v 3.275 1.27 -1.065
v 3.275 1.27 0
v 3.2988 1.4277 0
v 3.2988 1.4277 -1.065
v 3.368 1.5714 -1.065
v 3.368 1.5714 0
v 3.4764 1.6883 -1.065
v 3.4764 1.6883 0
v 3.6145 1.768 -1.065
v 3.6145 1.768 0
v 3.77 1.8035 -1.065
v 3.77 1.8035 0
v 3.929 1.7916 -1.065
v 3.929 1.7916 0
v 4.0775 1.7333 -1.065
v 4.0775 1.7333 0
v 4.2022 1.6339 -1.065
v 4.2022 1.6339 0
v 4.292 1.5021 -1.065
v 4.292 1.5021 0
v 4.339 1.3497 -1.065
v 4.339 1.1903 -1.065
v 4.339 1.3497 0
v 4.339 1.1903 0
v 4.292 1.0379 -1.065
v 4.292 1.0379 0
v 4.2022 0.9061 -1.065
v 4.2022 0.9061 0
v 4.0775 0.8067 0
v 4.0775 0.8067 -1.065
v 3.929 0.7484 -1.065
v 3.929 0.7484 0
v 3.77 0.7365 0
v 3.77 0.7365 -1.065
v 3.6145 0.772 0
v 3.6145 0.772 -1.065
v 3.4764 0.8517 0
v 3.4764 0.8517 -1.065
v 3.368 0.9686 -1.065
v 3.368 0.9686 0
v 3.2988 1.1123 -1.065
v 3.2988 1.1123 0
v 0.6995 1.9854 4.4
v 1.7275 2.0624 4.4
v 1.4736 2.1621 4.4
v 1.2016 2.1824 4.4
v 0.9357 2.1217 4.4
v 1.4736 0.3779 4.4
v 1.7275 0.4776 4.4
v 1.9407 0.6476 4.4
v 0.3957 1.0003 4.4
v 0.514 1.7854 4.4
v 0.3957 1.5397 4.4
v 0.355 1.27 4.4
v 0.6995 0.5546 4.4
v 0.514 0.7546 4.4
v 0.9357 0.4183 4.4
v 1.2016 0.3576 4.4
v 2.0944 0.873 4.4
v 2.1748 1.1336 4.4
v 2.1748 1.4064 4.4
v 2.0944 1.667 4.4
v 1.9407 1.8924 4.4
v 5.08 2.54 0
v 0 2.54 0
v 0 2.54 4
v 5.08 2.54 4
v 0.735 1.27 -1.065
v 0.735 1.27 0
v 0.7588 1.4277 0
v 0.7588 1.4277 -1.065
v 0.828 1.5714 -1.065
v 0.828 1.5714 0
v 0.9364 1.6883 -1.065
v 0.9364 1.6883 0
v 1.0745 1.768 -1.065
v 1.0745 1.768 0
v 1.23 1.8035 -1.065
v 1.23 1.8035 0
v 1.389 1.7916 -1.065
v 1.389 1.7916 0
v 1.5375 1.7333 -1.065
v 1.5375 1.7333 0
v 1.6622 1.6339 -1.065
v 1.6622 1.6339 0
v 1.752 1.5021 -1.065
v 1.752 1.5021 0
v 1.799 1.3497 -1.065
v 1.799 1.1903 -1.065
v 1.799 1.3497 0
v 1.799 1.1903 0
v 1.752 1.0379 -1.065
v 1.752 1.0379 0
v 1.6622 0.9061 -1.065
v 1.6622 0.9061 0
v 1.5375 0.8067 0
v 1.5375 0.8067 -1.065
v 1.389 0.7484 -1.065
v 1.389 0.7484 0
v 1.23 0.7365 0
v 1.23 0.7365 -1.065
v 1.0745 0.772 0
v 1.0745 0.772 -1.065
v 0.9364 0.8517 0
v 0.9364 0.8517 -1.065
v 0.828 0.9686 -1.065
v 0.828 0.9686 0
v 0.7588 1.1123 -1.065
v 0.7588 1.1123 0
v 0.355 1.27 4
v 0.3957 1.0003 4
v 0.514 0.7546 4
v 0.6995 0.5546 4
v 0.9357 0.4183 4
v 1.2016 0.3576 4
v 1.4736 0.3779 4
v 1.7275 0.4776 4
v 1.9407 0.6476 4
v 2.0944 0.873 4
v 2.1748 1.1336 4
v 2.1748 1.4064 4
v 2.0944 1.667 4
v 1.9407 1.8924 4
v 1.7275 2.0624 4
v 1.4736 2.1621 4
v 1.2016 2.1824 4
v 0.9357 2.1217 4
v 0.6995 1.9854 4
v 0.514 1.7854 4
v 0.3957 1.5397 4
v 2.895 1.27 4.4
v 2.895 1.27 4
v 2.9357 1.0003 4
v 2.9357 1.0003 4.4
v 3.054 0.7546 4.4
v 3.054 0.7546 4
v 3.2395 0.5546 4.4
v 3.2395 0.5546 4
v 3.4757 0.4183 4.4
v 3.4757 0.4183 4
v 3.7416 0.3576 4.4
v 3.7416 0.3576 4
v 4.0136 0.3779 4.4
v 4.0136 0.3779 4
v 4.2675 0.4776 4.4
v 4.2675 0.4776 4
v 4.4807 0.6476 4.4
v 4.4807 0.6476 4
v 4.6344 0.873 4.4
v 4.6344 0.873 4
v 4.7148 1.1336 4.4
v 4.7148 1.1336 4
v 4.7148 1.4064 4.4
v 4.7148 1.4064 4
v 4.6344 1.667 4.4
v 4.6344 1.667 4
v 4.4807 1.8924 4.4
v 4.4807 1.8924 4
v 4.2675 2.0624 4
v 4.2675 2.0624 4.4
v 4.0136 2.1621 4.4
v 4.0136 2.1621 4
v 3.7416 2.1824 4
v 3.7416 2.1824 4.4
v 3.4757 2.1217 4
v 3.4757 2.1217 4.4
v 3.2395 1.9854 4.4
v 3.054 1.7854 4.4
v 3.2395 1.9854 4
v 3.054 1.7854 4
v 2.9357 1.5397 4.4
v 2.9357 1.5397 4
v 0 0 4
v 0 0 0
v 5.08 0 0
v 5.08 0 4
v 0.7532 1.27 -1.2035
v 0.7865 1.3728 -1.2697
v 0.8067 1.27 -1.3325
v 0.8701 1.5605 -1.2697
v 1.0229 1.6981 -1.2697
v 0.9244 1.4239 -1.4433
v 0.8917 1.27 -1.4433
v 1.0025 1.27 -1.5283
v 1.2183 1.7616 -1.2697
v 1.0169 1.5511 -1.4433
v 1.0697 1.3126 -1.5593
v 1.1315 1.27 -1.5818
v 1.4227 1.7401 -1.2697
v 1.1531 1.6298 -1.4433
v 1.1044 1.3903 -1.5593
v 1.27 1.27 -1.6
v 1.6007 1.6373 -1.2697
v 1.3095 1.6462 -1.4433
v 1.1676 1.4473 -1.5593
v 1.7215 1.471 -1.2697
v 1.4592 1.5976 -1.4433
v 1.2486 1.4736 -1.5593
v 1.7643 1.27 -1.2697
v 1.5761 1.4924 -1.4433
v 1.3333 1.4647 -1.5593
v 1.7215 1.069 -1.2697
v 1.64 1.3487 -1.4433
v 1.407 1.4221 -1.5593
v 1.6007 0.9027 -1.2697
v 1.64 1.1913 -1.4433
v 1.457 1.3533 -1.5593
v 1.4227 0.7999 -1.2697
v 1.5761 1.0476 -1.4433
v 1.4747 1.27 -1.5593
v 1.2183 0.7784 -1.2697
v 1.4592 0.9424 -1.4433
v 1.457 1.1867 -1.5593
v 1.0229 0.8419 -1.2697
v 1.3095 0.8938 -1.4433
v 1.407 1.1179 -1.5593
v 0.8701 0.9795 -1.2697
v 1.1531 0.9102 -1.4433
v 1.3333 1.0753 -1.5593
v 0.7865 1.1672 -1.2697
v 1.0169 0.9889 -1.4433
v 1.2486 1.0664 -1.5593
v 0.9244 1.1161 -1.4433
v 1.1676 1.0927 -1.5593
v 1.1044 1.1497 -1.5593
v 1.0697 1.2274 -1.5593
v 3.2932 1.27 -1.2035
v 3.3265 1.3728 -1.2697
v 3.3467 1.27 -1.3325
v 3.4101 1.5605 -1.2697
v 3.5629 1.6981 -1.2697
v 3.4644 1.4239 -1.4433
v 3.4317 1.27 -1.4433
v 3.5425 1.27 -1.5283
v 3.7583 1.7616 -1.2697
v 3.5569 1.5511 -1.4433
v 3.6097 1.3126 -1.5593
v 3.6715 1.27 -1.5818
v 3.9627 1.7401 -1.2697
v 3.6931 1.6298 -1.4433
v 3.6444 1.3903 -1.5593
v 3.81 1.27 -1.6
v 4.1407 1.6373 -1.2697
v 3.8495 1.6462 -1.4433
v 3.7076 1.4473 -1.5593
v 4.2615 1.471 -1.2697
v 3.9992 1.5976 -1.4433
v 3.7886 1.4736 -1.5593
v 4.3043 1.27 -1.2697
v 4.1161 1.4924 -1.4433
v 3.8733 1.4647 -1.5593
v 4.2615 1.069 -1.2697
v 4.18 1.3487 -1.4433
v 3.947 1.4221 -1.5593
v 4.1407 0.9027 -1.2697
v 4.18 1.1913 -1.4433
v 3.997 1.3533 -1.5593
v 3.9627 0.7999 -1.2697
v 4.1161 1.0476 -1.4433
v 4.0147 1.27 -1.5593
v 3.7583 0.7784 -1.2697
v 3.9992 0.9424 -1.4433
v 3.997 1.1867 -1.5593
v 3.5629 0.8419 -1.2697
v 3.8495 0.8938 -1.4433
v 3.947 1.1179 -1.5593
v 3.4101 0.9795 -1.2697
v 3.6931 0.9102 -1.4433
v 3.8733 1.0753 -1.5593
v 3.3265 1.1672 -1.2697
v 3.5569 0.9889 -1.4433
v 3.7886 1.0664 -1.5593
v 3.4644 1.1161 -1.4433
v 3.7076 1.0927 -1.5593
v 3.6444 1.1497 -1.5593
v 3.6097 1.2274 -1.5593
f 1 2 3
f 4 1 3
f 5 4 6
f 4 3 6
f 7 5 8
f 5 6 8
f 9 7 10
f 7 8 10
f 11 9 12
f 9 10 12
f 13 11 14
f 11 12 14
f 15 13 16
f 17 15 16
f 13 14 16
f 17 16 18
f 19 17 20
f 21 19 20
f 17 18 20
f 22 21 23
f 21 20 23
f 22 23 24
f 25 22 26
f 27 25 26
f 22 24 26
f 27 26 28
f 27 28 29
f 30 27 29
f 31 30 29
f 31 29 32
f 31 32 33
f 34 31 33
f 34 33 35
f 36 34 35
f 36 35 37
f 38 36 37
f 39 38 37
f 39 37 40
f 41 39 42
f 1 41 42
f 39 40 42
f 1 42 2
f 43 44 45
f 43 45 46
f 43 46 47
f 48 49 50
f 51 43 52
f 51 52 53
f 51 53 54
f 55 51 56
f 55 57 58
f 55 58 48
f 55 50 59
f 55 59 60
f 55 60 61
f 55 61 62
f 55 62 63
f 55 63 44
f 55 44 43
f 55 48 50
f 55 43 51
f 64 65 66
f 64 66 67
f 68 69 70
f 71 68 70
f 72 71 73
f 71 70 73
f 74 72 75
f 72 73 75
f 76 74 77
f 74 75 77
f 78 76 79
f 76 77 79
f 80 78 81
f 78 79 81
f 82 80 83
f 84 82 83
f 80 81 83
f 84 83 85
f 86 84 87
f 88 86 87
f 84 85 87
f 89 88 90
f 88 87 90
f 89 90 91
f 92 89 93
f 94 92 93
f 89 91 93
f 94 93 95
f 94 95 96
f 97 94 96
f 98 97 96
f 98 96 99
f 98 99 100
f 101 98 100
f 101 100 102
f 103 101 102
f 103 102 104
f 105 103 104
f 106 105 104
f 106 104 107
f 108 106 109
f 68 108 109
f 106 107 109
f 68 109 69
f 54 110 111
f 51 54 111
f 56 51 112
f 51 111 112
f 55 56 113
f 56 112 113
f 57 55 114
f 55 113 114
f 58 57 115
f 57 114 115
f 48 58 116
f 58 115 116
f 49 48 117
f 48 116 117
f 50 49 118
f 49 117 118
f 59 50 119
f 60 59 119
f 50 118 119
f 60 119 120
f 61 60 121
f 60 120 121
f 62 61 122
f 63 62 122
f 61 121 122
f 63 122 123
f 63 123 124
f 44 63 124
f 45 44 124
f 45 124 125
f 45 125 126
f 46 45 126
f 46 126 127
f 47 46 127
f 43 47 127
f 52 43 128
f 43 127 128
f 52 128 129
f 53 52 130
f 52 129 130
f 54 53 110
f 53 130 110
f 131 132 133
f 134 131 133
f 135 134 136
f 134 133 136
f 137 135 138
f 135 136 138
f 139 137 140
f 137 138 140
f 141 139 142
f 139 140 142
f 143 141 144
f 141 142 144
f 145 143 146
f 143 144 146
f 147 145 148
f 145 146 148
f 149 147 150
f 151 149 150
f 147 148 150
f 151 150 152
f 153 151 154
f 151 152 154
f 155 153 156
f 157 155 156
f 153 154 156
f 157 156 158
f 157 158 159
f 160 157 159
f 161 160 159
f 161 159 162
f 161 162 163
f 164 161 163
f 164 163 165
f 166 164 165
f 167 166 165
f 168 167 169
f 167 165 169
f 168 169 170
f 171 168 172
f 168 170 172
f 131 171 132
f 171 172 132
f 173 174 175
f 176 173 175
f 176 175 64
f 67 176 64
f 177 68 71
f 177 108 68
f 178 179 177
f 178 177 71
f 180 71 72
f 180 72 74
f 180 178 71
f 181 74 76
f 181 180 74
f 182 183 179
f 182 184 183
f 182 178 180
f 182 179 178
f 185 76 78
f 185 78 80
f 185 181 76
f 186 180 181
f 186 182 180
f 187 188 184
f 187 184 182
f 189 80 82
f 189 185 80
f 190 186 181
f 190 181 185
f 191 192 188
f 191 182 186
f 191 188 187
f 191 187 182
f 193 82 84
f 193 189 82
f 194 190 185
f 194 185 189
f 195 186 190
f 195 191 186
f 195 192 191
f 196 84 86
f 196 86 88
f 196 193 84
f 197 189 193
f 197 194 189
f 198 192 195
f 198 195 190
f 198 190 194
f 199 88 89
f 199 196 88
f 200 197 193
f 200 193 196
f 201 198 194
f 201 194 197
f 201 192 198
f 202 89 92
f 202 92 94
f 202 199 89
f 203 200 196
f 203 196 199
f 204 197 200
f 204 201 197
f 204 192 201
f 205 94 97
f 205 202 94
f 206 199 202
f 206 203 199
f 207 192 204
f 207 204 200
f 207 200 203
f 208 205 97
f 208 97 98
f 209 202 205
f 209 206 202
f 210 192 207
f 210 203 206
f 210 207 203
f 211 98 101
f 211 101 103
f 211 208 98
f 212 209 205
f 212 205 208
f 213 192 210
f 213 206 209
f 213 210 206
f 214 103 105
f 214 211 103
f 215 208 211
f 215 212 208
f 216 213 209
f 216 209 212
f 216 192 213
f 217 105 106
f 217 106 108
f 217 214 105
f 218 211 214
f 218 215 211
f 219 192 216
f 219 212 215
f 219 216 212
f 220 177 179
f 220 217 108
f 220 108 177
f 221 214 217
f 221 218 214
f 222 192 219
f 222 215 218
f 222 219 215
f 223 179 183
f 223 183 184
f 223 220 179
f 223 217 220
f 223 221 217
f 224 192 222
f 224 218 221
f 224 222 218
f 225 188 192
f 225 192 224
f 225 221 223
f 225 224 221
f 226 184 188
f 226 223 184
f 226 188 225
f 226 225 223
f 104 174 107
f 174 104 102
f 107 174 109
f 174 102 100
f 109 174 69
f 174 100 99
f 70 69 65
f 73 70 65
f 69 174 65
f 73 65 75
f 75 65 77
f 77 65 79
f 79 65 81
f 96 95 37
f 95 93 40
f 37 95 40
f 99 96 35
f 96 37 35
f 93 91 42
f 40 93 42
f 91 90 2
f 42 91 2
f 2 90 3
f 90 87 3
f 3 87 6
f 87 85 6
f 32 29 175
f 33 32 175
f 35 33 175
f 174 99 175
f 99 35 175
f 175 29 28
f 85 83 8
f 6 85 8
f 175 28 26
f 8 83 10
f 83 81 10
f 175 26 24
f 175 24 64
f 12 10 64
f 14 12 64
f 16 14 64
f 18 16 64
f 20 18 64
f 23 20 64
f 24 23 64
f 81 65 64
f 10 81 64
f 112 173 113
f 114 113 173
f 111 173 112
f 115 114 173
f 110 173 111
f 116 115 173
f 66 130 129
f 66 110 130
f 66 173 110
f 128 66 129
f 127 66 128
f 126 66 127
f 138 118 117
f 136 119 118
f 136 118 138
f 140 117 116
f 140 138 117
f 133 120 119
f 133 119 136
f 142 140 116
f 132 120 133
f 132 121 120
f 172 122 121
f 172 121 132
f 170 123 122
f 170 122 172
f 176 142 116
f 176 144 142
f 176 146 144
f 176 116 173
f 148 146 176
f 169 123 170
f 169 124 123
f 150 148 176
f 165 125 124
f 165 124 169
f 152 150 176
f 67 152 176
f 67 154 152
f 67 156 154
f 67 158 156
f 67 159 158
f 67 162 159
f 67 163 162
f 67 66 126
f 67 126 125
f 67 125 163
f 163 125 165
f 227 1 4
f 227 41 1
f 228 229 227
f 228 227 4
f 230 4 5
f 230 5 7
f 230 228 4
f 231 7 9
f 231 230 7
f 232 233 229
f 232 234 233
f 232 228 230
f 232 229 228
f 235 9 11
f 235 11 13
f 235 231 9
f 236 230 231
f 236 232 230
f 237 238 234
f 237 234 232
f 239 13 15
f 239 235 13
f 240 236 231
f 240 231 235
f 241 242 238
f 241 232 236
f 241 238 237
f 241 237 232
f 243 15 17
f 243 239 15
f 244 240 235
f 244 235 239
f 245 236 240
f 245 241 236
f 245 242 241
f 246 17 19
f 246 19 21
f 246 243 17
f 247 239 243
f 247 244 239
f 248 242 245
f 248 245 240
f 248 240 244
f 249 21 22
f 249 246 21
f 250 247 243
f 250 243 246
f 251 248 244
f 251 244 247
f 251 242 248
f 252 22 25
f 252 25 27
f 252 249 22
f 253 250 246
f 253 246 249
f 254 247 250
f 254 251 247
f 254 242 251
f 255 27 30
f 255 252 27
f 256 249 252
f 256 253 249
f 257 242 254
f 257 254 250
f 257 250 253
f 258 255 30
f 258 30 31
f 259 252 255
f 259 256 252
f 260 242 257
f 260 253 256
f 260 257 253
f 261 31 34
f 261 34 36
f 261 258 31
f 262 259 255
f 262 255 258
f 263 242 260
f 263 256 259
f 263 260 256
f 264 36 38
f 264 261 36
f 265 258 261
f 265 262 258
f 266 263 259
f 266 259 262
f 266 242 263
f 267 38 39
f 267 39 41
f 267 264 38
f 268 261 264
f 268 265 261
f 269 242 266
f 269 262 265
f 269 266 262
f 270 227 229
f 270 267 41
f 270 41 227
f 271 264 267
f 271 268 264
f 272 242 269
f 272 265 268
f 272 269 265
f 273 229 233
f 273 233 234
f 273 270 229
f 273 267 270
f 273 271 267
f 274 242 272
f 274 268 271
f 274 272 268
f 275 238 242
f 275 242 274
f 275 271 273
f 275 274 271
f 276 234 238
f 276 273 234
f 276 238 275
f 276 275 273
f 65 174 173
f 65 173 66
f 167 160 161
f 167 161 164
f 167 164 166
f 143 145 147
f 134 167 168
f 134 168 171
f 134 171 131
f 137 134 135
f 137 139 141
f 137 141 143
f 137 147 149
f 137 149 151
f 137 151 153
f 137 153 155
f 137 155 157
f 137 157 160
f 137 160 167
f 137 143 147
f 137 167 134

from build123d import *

# Parameters (mm, degrees)
ESQUISSE1_W       = 5.08
ESQUISSE1_H       = 2.54
EXTRUSION1_DEPTH  = 4
ESQUISSE2_R       = 0.915
EXTRUSION2_DEPTH  = 0.4
ESQUISSE3_R       = 0.535
EXTRUSION3_DEPTH  = 1.065
D_ME1_FACE_RADIUS = 0.535
D_ME1_HEIGHT      = 0.535
D_ME2_FACE_RADIUS = 0.535
D_ME2_HEIGHT      = 0.535


with BuildPart() as part:
    # Esquisse1 → Extrusion1 (new body)
    with BuildSketch(Plane.XY):
        with Locations((2.54, 1.27)):
            Rectangle(ESQUISSE1_W, ESQUISSE1_H)
    extrude(amount=EXTRUSION1_DEPTH)

    # Esquisse2 → Extrusion2 (add)
    with BuildSketch(Plane.XY.offset(4)):
        with Locations(Location((3.81, 1.27, 0), (0, 0, 180))):
            Circle(ESQUISSE2_R)
        with Locations(Location((1.27, 1.27, 0), (0, 0, 180))):
            Circle(ESQUISSE2_R)
    extrude(amount=EXTRUSION2_DEPTH)

    # Esquisse3 → Extrusion3 (add)
    with BuildSketch(Plane(origin=(0, 0, 0), x_dir=(-1, 0, 0), z_dir=(0, 0, -1))):
        with Locations((-3.81, 1.27)):
            Circle(ESQUISSE3_R)
        with Locations((-1.27, 1.27)):
            Circle(ESQUISSE3_R)
    extrude(amount=EXTRUSION3_DEPTH)

    # Dôme1: a dome of height H over a round flat face of radius A is a cap of a sphere of radius (A * A + H * H) / (2 * H)
    d_me1_r = (D_ME1_FACE_RADIUS * D_ME1_FACE_RADIUS + D_ME1_HEIGHT * D_ME1_HEIGHT) / (2 * D_ME1_HEIGHT)
    d_me1_base = Plane((3.81, 1.27, -1.065), z_dir=(0, 0, -1))
    with Locations(d_me1_base.offset(D_ME1_HEIGHT - d_me1_r)):
        d_me1_ball = Sphere(d_me1_r, mode=Mode.PRIVATE)
    add(split(d_me1_ball, bisect_by=d_me1_base, keep=Keep.TOP, mode=Mode.PRIVATE))

    # Dôme2: a dome of height H over a round flat face of radius A is a cap of a sphere of radius (A * A + H * H) / (2 * H)
    d_me2_r = (D_ME2_FACE_RADIUS * D_ME2_FACE_RADIUS + D_ME2_HEIGHT * D_ME2_HEIGHT) / (2 * D_ME2_HEIGHT)
    d_me2_base = Plane((1.27, 1.27, -1.065), z_dir=(0, 0, -1))
    with Locations(d_me2_base.offset(D_ME2_HEIGHT - d_me2_r)):
        d_me2_ball = Sphere(d_me2_r, mode=Mode.PRIVATE)
    add(split(d_me2_ball, bisect_by=d_me2_base, keep=Keep.TOP, mode=Mode.PRIVATE))


solid = part.part
